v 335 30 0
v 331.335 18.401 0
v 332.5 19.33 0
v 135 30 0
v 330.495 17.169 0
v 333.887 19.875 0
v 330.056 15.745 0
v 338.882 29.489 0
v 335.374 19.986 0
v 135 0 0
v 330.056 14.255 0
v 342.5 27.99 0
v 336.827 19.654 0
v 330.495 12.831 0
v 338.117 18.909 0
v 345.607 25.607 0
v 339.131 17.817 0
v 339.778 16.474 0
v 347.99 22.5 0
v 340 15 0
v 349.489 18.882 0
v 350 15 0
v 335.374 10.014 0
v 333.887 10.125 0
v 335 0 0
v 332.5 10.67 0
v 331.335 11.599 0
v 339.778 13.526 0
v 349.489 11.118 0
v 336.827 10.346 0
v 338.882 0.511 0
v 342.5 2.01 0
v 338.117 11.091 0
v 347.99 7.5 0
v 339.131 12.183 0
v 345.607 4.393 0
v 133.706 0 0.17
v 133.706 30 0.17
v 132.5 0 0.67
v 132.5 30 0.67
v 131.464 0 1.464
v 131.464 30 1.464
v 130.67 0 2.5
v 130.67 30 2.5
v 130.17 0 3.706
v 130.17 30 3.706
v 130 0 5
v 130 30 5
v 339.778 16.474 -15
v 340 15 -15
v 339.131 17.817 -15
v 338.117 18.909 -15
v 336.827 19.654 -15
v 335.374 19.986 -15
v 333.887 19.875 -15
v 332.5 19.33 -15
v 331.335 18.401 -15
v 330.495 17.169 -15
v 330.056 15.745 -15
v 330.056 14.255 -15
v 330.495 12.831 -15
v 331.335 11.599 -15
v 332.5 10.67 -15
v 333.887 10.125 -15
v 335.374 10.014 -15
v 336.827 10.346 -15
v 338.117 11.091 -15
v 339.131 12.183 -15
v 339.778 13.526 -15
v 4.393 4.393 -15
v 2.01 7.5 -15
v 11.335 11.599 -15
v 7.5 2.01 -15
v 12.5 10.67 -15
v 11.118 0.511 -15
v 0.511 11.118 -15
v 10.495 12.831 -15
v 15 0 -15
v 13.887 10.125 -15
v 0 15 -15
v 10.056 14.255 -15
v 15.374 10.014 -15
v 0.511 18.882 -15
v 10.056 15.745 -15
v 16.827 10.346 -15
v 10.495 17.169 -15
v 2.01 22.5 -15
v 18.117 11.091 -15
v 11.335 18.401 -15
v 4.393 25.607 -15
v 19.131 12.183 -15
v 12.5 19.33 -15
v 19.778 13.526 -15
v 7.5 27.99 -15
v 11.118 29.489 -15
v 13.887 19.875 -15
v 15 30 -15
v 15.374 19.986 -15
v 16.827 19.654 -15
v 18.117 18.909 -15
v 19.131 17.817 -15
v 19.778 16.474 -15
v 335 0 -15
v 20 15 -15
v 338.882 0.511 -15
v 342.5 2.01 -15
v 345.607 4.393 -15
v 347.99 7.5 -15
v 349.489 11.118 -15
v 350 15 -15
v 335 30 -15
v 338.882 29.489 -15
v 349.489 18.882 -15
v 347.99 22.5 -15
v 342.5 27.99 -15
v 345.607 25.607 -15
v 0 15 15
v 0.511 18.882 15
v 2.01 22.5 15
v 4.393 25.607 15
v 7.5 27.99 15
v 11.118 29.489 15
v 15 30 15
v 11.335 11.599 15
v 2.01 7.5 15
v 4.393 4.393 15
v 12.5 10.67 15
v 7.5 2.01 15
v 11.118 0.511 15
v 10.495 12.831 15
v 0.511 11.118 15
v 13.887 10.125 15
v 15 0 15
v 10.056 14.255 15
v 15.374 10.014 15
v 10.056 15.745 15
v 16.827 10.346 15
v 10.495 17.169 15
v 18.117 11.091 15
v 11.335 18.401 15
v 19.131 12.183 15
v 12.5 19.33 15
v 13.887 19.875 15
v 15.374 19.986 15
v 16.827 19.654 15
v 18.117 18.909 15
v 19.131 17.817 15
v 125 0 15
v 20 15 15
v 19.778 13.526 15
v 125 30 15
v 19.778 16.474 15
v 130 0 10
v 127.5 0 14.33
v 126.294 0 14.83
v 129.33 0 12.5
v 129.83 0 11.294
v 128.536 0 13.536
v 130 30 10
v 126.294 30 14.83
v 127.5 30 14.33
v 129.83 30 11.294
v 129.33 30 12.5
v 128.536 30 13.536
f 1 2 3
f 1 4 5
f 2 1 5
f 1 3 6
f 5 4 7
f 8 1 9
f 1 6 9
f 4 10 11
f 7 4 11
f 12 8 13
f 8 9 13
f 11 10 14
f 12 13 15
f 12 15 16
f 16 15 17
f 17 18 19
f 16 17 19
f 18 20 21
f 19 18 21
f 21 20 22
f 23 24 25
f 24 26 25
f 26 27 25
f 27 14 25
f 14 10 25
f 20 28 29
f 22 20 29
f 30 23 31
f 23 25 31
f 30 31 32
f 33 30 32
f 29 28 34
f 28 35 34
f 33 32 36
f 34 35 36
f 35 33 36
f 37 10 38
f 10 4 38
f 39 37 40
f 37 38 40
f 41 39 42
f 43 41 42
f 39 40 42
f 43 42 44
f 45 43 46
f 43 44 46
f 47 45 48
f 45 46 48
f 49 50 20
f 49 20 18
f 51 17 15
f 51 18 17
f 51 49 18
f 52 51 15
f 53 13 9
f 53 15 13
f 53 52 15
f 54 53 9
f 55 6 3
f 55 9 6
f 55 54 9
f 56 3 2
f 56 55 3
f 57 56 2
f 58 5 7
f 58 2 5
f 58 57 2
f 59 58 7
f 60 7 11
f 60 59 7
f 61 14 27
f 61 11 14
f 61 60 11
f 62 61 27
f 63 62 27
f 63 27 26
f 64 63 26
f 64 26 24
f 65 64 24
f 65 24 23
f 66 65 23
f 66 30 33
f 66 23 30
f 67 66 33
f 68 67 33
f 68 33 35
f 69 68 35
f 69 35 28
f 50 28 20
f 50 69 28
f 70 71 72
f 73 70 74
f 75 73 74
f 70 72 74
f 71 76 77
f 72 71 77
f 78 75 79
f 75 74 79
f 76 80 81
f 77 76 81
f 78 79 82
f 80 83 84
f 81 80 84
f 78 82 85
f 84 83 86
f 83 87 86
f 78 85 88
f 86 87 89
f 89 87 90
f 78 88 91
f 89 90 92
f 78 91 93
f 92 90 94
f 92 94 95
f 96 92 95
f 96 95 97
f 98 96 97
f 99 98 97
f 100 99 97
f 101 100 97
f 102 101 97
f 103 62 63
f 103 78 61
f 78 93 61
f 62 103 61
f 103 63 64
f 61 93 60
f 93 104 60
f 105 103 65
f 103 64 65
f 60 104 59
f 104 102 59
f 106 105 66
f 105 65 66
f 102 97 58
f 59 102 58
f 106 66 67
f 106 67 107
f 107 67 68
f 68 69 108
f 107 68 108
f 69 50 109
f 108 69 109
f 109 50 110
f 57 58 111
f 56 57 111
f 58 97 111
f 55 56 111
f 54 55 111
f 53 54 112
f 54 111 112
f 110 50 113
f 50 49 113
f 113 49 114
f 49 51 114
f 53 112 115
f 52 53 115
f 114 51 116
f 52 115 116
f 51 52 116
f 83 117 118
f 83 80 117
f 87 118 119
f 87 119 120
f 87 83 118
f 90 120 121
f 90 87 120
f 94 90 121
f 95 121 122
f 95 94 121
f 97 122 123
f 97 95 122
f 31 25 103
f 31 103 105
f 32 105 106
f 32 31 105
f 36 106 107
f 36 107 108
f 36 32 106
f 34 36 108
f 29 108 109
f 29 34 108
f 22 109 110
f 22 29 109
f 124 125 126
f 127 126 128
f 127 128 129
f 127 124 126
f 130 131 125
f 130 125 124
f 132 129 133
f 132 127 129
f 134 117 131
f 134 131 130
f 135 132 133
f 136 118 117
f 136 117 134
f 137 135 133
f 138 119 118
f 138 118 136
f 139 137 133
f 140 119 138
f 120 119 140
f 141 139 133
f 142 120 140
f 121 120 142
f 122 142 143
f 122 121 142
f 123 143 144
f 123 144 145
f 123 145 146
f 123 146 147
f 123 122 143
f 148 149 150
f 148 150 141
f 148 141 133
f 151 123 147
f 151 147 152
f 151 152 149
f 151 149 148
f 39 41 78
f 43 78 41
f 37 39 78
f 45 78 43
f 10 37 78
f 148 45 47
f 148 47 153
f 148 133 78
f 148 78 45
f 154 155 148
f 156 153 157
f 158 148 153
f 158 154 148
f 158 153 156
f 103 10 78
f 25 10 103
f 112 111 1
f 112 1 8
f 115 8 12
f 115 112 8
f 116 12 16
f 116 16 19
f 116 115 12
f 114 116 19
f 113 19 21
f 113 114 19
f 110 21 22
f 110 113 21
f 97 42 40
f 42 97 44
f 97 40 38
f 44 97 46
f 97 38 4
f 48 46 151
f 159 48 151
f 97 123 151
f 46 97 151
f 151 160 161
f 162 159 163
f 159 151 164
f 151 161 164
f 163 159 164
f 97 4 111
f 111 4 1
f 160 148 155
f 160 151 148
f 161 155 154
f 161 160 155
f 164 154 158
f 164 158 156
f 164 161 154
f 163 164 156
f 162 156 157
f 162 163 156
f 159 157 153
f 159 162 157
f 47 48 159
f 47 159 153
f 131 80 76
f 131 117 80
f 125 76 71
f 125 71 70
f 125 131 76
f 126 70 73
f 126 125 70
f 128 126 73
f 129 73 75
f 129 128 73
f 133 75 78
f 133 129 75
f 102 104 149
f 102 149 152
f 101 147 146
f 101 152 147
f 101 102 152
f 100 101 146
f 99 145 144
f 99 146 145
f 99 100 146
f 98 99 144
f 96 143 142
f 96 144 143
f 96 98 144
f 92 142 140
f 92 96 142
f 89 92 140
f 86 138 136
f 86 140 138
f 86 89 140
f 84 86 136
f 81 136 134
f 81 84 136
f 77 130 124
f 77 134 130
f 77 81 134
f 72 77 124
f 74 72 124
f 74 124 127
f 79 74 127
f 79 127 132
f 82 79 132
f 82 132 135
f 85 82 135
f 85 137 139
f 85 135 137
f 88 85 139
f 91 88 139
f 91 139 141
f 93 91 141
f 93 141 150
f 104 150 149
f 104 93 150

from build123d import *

# Parameters (mm, degrees)
SKETCH1_W               = 350
SKETCH1_H               = 30
BOSS_EXTRUDE1_DEPTH     = 15
CUT_EXTRUDE2_DEPTH      = 353.562051276
CUT_EXTRUDE2_DEPTH_BACK = 353.562051276
SKETCH3_R               = 5
FILLET3_R               = 15
CUT_EXTRUDE3_DEPTH      = 353.562051276
CUT_EXTRUDE3_DEPTH_BACK = 10
SKETCH4_R               = 5
FILLET4_R               = 5
CUT_EXTRUDE4_REACH      = 353.603
SKETCH6_W               = 245
SKETCH6_H               = 5
FILLET6_R               = 5


with BuildPart() as part:
    # Sketch1 → Boss-Extrude1 (new, symmetric)
    with BuildSketch(Plane.XY):
        with Locations((175, 15)):
            Rectangle(SKETCH1_W, SKETCH1_H)
    extrude(amount=BOSS_EXTRUDE1_DEPTH, both=True)

    # Sketch3 → Cut-Extrude2 (cut, two sides: drawn at the far end of the back side and taken through both)
    with BuildSketch(Plane.XY.offset(15).offset(-CUT_EXTRUDE2_DEPTH_BACK)):
        with Locations((15, 15)):
            Circle(SKETCH3_R)
        with Locations((335, 15)):
            Circle(SKETCH3_R)
    extrude(amount=CUT_EXTRUDE2_DEPTH + CUT_EXTRUDE2_DEPTH_BACK, mode=Mode.SUBTRACT)

    # Fillet3
    fillet3_edges = [part.edges().sort_by_distance(p)[0] for p in [
        (350, 0, 0),
        (350, 30, 0),
        (0, 0, 0),
        (0, 30, 0),
    ]]
    fillet(fillet3_edges, radius=FILLET3_R - 0.0001)  # a hair under: the kernel refuses the full size

    # Sketch4 → Cut-Extrude3 (cut, two sides: drawn at the far end of the back side and taken through both)
    with BuildSketch(Plane.XY.offset(15).offset(-CUT_EXTRUDE3_DEPTH_BACK)):
        with BuildLine():
            Line((130, 30), (130, 0))
            Line((130, 0), (335.0001, 0))
            ThreePointArc((335.0001, 0), (345.606631007, 4.393368993), (350, 14.9999))
            Line((350, 14.9999), (350, 15.0001))
            ThreePointArc((350, 15.0001), (345.606631007, 25.606631007), (335.0001, 30))
            Line((335.0001, 30), (130, 30))
        make_face()
        with Locations((335, 15)):
            Circle(SKETCH4_R, mode=Mode.SUBTRACT)
    extrude(amount=CUT_EXTRUDE3_DEPTH + CUT_EXTRUDE3_DEPTH_BACK, mode=Mode.SUBTRACT)

    # Fillet4
    fillet4_edges = [part.edges().sort_by_distance(p)[0] for p in [
        (130, 15, 15),
    ]]
    fillet(fillet4_edges, radius=FILLET4_R)

    # Sketch6 → Cut-Extrude4 (cut, up to next)
    with BuildSketch(Plane.XZ, mode=Mode.PRIVATE) as cut_extrude4_sk1:
        with Locations((252.5, 2.5)):
            Rectangle(SKETCH6_W, SKETCH6_H)
    cut_extrude4_tool1 = extrude(cut_extrude4_sk1.sketch, amount=-CUT_EXTRUDE4_REACH, mode=Mode.PRIVATE) & part.part
    add(cut_extrude4_tool1.solids().sort_by_distance((252.5, 0, 2.5))[0], mode=Mode.SUBTRACT)

    # Fillet6
    fillet6_edges = [part.edges().sort_by_distance(p)[0] for p in [
        (130, 15, 0),
    ]]
    fillet(fillet6_edges, radius=FILLET6_R)


solid = part.part
